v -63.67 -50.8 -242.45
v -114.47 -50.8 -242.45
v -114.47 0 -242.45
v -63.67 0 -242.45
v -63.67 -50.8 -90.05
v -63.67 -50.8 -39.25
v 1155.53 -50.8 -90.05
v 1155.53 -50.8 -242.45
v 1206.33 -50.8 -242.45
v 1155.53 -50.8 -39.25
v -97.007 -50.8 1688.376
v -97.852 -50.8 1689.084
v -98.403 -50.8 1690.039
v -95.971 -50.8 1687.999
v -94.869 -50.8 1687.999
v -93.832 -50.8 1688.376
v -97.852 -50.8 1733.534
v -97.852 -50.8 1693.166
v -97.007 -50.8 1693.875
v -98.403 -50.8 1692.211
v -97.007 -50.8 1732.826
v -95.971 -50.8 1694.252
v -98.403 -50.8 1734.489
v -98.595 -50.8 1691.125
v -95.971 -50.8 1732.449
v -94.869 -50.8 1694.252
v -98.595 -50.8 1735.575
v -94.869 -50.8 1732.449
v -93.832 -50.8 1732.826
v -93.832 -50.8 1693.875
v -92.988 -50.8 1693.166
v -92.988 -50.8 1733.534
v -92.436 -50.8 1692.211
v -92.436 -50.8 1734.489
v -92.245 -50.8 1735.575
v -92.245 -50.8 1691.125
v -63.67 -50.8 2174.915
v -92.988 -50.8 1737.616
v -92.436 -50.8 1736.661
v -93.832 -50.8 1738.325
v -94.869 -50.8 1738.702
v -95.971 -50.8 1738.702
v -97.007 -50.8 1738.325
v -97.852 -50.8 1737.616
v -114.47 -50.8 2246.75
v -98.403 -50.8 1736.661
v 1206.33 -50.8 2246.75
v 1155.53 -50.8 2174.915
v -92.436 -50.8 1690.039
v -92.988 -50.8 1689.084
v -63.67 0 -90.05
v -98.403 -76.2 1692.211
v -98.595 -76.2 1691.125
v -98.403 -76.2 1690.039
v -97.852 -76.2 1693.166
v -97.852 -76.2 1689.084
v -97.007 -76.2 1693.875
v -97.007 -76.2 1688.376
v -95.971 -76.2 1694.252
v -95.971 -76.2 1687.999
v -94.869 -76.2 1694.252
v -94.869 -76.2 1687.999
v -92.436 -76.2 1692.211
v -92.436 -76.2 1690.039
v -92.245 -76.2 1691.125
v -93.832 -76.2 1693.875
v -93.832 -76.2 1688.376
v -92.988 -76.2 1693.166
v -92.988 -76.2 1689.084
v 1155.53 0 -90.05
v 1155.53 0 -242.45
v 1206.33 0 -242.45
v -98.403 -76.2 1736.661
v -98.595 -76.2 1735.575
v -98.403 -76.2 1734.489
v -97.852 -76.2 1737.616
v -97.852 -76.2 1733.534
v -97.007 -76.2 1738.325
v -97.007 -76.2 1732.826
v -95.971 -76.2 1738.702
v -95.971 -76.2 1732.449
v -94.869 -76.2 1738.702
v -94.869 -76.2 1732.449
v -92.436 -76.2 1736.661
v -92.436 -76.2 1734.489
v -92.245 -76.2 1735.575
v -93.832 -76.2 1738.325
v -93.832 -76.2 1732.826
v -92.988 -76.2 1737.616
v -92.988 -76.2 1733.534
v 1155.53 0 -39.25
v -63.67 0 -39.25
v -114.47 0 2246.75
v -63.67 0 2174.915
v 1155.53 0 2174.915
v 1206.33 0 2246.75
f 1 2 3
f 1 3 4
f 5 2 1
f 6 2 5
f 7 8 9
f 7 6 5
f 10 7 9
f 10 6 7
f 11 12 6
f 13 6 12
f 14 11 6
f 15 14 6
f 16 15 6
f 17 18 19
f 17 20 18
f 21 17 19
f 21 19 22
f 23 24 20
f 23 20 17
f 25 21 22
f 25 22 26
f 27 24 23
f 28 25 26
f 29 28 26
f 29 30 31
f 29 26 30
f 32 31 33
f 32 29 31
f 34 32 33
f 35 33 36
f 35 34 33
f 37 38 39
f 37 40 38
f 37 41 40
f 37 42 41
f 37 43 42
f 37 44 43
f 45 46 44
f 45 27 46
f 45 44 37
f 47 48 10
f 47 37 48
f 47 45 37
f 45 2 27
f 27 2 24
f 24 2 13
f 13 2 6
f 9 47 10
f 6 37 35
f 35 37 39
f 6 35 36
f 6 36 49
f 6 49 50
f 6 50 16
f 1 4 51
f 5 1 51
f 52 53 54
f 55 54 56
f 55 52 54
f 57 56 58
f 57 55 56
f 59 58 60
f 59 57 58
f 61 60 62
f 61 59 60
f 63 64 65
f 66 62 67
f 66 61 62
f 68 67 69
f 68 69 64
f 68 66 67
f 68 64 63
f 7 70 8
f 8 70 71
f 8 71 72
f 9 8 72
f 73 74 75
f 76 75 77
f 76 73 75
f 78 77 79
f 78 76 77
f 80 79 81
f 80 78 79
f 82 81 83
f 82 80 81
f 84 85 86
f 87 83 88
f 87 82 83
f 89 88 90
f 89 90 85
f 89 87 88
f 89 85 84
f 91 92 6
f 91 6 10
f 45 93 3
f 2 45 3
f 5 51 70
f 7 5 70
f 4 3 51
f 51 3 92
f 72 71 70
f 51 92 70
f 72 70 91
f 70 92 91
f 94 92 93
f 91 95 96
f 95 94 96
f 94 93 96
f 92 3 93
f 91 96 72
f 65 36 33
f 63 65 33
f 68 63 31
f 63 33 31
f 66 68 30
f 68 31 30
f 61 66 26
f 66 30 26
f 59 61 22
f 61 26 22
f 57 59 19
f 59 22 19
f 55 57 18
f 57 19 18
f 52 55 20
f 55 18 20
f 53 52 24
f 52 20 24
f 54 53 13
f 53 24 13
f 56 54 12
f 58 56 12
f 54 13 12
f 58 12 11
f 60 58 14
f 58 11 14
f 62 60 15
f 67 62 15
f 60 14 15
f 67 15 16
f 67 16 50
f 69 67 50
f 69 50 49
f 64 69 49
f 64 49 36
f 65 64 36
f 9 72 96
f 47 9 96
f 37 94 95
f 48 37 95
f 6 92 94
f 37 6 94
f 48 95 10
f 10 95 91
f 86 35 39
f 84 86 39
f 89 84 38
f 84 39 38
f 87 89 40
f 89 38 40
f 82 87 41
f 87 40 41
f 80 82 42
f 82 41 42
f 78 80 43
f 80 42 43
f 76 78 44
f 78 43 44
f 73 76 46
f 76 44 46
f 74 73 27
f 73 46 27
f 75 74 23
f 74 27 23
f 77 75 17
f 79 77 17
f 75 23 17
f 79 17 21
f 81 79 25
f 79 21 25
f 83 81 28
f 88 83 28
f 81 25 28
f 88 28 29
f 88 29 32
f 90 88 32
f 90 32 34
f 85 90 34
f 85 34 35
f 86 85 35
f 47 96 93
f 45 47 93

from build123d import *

# Parameters (mm, degrees)
F0_W     = 1219.2
F0_H     = 71.835716
F0_H_2   = 50.8
F1_DEPTH = 50.8
F3_R     = 3.175
F2_R     = 3.175
F4_DEPTH = 25.4
F0_W_2   = 50.8
F0_H_3   = 152.4
F5_DEPTH = 50.8


with BuildPart() as f1:
    # F0 (on Front) → F1 (new body)
    with BuildSketch(Plane.XZ):
        Polygon((1206.330058, 2246.750314), (1155.530058, 2246.750314), (1155.530058, 2174.914598), (1155.530058, -39.249686), (1155.530058, -90.049686), (1206.330058, -90.049686), align=None)
        with Locations((545.930058, 2210.832456)):
            Rectangle(F0_W, F0_H)
        Polygon((-63.669942, 2246.750314), (-114.469942, 2246.750314), (-114.469942, -90.049686), (-63.669942, -90.049686), (-63.669942, -39.249686), (-63.669942, 2174.914598), align=None)
        with Locations((545.930058, -64.649686)):
            Rectangle(F0_W, F0_H_2)
    extrude(amount=F1_DEPTH)

    # F3 (on face) + F2 (on face) → F4 (join)
    with BuildSketch(Plane.XZ.offset(50.8)):
        with Locations((-95.419942, 1691.125314)):
            Circle(F3_R)
        with Locations((-95.419942, 1735.575314)):
            Circle(F3_R)
    with BuildSketch(Plane.XZ.offset(50.8)):
        with Locations((-95.419942, 1735.575314)):
            Circle(F2_R)
    extrude(amount=F4_DEPTH)

    # F0 (on Front) → F5 (join)
    with BuildSketch(Plane.XZ):
        Polygon((1206.330058, 2246.750314), (1155.530058, 2246.750314), (1155.530058, 2174.914598), (1155.530058, -39.249686), (1155.530058, -90.049686), (1206.330058, -90.049686), align=None)
        with Locations((1180.930058, -166.249686)):
            Rectangle(F0_W_2, F0_H_3)
        with Locations((-89.069942, -166.249686)):
            Rectangle(F0_W_2, F0_H_3)
    extrude(amount=F5_DEPTH)


solid = f1.part
